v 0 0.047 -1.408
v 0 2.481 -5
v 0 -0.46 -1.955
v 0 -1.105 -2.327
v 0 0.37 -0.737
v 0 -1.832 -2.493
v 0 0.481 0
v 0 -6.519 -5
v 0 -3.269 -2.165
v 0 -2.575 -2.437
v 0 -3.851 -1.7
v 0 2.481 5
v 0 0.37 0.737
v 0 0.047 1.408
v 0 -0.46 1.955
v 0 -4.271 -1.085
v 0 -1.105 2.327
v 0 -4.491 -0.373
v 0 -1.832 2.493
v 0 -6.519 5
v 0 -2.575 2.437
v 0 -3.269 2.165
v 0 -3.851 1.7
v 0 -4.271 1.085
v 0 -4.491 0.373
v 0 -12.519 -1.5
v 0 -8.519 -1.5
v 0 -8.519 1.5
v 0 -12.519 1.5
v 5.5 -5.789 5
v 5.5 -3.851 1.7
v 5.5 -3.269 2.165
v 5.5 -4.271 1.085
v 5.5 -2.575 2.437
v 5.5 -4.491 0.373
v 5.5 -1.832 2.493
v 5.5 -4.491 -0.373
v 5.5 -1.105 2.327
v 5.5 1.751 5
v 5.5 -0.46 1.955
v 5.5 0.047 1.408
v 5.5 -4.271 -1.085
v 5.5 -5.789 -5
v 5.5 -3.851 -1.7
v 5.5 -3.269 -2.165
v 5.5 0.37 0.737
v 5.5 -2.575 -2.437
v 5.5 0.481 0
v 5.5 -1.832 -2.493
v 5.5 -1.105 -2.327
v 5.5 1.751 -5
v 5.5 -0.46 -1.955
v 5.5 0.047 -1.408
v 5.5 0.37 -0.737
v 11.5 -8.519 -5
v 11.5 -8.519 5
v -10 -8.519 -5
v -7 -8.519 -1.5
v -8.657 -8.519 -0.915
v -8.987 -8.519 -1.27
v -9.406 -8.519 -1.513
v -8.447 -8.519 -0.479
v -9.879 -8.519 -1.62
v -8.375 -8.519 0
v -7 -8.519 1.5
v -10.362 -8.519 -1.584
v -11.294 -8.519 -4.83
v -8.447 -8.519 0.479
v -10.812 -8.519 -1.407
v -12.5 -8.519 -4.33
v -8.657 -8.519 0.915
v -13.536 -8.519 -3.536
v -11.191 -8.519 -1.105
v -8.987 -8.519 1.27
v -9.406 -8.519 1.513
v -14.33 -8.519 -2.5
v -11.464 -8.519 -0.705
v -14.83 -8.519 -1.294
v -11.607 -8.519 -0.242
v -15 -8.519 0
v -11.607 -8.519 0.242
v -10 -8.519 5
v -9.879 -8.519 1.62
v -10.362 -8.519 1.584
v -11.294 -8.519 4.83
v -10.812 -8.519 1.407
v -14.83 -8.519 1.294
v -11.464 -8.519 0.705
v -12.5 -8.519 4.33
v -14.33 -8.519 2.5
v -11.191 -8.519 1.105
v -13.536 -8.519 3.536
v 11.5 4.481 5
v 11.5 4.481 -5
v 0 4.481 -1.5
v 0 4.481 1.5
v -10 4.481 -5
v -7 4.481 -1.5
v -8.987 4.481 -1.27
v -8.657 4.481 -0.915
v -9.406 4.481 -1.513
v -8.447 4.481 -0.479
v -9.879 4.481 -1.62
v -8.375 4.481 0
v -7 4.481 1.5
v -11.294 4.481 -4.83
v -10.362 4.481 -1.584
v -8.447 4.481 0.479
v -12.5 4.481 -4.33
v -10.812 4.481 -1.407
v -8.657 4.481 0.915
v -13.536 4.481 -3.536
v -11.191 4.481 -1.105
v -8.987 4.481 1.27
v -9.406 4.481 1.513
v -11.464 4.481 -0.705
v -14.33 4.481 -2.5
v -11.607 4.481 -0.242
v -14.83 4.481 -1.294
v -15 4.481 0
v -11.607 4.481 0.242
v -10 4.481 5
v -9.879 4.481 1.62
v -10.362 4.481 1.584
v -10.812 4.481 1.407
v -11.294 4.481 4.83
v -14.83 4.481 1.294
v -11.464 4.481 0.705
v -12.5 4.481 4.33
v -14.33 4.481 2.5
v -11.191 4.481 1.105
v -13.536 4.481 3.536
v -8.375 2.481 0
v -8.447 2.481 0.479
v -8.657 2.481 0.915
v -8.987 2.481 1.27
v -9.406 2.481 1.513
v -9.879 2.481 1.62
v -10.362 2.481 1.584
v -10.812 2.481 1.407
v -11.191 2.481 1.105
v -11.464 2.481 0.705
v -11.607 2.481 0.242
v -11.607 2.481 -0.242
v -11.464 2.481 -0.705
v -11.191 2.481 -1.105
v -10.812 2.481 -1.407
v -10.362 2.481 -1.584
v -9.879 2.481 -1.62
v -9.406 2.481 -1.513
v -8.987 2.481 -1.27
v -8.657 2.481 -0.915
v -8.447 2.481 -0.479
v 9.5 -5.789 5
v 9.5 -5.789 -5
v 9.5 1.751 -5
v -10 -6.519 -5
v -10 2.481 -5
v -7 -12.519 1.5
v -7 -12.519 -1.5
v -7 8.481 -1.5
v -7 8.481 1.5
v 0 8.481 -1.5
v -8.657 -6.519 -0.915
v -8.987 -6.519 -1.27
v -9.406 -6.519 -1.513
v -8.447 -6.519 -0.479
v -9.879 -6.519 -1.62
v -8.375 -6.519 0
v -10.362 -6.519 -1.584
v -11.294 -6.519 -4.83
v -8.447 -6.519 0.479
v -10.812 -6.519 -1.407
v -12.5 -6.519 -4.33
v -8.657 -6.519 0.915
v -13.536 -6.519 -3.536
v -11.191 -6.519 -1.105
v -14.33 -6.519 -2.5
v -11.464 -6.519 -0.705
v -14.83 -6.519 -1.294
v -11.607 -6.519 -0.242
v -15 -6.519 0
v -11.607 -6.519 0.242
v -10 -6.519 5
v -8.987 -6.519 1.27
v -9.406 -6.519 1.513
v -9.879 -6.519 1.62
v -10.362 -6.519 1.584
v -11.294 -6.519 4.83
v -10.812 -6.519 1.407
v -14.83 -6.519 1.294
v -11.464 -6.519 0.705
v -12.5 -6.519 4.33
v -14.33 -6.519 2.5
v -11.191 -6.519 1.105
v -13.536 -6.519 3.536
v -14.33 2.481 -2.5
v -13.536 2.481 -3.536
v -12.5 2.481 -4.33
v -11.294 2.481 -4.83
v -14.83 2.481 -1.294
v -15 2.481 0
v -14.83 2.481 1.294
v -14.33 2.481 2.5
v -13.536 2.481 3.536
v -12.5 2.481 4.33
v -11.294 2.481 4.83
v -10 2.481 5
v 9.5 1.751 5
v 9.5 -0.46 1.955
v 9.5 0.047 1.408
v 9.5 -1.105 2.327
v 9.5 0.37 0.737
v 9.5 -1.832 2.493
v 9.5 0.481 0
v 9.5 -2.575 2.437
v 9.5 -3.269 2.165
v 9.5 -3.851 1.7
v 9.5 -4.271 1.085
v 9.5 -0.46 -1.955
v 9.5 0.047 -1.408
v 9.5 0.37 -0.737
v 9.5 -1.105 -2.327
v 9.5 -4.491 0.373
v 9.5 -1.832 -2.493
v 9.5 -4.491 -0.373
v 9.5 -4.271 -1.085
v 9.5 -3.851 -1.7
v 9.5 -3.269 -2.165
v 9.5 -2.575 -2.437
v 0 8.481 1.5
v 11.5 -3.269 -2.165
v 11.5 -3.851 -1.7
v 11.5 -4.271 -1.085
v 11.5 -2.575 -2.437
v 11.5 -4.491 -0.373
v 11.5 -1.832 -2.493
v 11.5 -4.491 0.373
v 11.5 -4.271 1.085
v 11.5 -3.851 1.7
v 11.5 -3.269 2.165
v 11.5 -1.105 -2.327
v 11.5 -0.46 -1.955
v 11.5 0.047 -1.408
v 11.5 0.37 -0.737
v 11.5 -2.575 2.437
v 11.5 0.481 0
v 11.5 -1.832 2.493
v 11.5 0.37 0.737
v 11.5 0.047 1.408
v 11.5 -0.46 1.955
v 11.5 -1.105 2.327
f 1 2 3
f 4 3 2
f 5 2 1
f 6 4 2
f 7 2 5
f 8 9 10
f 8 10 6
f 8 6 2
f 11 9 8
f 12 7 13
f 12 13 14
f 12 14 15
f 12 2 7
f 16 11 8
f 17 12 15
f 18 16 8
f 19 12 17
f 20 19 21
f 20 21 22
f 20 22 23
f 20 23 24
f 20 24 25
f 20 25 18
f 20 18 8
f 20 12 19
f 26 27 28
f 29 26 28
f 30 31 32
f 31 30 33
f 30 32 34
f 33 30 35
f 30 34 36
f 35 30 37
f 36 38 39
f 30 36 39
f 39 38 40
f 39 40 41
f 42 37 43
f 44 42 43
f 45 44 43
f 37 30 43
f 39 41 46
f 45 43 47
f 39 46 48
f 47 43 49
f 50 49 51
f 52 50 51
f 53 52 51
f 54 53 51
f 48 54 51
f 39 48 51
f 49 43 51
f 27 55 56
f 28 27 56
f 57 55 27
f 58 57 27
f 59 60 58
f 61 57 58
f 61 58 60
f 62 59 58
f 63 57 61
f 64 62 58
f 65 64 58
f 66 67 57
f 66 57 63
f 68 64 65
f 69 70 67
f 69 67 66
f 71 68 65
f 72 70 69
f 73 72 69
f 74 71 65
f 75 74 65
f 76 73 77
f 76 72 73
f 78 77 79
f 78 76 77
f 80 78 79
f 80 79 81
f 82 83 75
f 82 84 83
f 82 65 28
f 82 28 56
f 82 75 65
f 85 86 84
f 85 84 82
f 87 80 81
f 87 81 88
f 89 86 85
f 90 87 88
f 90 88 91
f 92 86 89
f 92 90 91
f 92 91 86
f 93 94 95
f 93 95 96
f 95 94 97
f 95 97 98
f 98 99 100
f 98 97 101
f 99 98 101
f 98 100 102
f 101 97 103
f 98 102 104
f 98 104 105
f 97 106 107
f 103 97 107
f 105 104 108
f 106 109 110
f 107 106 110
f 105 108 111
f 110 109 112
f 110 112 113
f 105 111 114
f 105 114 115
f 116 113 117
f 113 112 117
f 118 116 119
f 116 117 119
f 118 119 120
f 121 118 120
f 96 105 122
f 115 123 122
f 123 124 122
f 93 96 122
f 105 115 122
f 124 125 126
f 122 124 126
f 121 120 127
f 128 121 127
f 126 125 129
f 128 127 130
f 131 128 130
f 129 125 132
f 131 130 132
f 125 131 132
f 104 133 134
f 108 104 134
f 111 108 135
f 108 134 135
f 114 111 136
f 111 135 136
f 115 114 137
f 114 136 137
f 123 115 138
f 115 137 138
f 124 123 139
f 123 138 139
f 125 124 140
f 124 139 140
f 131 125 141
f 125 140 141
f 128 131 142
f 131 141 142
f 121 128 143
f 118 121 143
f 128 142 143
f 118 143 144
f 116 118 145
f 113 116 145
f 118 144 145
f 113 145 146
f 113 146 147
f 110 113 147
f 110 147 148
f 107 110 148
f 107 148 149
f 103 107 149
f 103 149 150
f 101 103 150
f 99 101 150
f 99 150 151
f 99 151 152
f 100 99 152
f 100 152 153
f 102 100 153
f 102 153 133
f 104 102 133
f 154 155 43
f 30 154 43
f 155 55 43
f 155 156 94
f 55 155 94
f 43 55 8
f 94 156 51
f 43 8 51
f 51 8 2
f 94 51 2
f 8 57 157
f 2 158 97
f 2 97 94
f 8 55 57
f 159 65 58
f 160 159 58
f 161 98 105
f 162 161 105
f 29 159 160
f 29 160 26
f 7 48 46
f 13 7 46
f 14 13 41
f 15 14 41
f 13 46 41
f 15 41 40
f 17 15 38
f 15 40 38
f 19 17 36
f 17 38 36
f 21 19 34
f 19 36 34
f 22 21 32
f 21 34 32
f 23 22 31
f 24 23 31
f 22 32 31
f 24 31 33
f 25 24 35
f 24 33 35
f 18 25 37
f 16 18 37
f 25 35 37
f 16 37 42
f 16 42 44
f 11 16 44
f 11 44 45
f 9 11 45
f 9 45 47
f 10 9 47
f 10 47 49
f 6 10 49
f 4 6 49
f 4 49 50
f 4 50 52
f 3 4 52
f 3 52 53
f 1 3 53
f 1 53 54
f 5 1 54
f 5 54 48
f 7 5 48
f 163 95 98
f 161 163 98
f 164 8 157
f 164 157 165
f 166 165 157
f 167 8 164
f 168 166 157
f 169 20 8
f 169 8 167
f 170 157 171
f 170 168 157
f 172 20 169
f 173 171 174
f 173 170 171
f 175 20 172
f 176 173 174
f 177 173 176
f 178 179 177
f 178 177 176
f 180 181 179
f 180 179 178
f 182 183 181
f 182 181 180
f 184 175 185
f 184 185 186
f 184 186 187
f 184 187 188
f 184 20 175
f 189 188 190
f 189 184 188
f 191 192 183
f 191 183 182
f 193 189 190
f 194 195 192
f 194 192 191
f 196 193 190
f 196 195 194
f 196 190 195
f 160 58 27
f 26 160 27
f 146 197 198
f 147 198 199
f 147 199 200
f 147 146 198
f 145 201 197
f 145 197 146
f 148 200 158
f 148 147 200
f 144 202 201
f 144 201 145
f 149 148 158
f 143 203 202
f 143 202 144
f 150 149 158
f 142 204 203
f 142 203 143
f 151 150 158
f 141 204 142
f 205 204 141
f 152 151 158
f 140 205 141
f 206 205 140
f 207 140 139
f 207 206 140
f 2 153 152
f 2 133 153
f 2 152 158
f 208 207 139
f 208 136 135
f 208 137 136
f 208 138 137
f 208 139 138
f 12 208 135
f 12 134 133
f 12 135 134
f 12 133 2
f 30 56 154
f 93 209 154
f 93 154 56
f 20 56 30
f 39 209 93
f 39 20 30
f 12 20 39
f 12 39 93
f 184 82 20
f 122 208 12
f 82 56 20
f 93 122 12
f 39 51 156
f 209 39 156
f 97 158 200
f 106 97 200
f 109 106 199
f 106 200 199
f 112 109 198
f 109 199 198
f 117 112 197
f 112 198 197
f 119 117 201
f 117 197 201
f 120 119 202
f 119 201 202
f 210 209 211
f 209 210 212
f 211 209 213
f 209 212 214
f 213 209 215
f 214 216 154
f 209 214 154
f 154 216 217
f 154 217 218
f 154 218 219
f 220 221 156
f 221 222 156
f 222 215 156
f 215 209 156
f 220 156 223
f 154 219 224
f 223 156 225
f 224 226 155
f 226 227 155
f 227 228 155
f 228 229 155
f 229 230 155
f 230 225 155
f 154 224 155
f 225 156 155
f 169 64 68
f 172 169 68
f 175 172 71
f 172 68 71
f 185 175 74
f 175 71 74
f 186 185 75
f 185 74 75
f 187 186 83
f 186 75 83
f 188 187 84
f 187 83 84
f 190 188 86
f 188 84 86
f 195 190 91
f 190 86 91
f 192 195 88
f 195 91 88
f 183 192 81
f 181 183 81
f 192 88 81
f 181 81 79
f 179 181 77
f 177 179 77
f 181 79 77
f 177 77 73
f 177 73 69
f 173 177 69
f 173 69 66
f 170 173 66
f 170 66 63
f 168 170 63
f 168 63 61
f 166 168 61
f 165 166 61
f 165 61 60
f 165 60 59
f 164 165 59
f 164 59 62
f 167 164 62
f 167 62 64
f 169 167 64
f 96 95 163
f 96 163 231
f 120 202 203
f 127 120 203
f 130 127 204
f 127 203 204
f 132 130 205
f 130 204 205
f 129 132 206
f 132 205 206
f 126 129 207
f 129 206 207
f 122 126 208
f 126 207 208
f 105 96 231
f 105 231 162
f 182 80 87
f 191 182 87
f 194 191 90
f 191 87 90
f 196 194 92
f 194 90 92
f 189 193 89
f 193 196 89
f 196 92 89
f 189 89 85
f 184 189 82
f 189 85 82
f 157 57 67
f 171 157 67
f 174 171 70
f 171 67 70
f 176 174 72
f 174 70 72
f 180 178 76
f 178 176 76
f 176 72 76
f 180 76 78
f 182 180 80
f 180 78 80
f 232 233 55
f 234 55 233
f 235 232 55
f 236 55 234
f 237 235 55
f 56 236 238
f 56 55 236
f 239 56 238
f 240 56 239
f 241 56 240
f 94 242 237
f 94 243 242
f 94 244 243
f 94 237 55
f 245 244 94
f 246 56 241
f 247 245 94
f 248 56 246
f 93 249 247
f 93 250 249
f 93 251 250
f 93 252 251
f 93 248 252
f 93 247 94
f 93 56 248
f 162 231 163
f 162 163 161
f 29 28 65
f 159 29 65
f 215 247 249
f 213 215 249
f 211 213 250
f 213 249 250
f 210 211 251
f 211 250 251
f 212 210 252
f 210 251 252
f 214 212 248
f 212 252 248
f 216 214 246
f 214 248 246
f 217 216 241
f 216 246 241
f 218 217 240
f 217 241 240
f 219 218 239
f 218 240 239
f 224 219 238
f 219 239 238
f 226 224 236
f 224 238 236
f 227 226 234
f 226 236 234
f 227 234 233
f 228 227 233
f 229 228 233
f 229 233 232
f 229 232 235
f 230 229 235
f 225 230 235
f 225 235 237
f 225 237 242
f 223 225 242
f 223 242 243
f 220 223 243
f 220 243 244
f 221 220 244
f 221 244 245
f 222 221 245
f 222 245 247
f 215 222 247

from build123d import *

# Parameters (mm, degrees)
F1_DEPTH  = 5
F2_R      = 1.625
F3_DEPTH  = 25
F4_DEPTH  = 25
F6_DEPTH  = 4
F7_W      = 7
F7_H      = 3
F8_DEPTH  = 4
F9_DEPTH  = 1.5
F11_DEPTH = 7
F13_DEPTH = 25
F14_D     = 5
F14_DEPTH = 20
F14_TIP   = 1.5021515476


with BuildPart() as f1:
    # F0 (on Top) → F1 (new body, symmetric)
    with BuildSketch(Plane.XY):
        Polygon((0, -6.5188171205), (-15, -6.5188171205), (-15, -8.5188171205), (3, -8.5188171205), (3, 4.4811828795), (-15, 4.4811828795), (-15, 2.4811828795), (0, 2.4811828795), (0, 0), align=None)
    extrude(amount=F1_DEPTH, both=True)

    # F2 (on face) → F3 (cut)
    with BuildSketch(Plane.XZ.offset(8.5188171205)):
        with Locations((-10, 0)):
            Circle(F2_R)
    extrude(amount=-F3_DEPTH, mode=Mode.SUBTRACT)

    # F2 (on face) → F4 (cut)
    with BuildSketch(Plane.XZ.offset(8.5188171205)):
        with BuildLine():
            ThreePointArc((-15, 0), (-13.5355339059, 3.5355339059), (-10, 5))
            Line((-10, 5), (-15, 5))
            Line((-15, 5), (-15, 0))
        make_face()
        with BuildLine():
            Line((-15, -5), (-10, -5))
            ThreePointArc((-10, -5), (-13.5355339059, -3.5355339059), (-15, 0))
            Line((-15, 0), (-15, -5))
        make_face()
    extrude(amount=-F4_DEPTH, mode=Mode.SUBTRACT)

    # F5 (on face) → F6 (join)
    with BuildSketch(Plane.XZ.offset(8.5188171205)):
        Polygon((0, 0), (0, 1.5), (-7, 1.5), (-7, -1.5), (0, -1.5), align=None)
    extrude(amount=F6_DEPTH)

    # F7 (on face) → F8 (join)
    with BuildSketch(Plane(origin=(0, 4.4811828795, 0), x_dir=(-1, 0, 0), z_dir=(0, 1, 0))):
        with Locations((3.5, 0)):
            Rectangle(F7_W, F7_H)
    extrude(amount=F8_DEPTH)

    # F9 (add): a face of the model
    f9_faces = [f1.faces().sort_by_distance(p)[0] for p in [
        (3, -2.0188171205, 0),
    ]]
    extrude(f9_faces, amount=F9_DEPTH)

    # F11 (add): a face of the model
    f11_faces = [f1.faces().sort_by_distance(p)[0] for p in [
        (4.5, -2.0188171205, 0),
    ]]
    extrude(f11_faces, amount=F11_DEPTH)

    # F12 (on face) → F13 (cut)
    with BuildSketch(Plane(origin=(0, 0, -5), x_dir=(1, 0, 0), z_dir=(0, 0, -1))):
        Polygon((9.5, -1.7511828795), (9.5, 2.0188171205), (9.5, 5.7888171205), (5.5, 5.7888171205), (5.5, -1.7511828795), align=None)
    extrude(amount=-F13_DEPTH, mode=Mode.SUBTRACT)

    # F14
    with Locations(Plane(origin=(0, 0, 0), x_dir=(0, -1, 0), z_dir=(-1, 0, 0))):
        with Locations((2.0188171205, 0)):
            Hole(F14_D / 2, depth=F14_DEPTH)
            with Locations((0, 0, -(F14_DEPTH + F14_TIP / 2))):  # 118° drill point
                Cone(0, F14_D / 2, F14_TIP, mode=Mode.SUBTRACT)


solid = f1.part
